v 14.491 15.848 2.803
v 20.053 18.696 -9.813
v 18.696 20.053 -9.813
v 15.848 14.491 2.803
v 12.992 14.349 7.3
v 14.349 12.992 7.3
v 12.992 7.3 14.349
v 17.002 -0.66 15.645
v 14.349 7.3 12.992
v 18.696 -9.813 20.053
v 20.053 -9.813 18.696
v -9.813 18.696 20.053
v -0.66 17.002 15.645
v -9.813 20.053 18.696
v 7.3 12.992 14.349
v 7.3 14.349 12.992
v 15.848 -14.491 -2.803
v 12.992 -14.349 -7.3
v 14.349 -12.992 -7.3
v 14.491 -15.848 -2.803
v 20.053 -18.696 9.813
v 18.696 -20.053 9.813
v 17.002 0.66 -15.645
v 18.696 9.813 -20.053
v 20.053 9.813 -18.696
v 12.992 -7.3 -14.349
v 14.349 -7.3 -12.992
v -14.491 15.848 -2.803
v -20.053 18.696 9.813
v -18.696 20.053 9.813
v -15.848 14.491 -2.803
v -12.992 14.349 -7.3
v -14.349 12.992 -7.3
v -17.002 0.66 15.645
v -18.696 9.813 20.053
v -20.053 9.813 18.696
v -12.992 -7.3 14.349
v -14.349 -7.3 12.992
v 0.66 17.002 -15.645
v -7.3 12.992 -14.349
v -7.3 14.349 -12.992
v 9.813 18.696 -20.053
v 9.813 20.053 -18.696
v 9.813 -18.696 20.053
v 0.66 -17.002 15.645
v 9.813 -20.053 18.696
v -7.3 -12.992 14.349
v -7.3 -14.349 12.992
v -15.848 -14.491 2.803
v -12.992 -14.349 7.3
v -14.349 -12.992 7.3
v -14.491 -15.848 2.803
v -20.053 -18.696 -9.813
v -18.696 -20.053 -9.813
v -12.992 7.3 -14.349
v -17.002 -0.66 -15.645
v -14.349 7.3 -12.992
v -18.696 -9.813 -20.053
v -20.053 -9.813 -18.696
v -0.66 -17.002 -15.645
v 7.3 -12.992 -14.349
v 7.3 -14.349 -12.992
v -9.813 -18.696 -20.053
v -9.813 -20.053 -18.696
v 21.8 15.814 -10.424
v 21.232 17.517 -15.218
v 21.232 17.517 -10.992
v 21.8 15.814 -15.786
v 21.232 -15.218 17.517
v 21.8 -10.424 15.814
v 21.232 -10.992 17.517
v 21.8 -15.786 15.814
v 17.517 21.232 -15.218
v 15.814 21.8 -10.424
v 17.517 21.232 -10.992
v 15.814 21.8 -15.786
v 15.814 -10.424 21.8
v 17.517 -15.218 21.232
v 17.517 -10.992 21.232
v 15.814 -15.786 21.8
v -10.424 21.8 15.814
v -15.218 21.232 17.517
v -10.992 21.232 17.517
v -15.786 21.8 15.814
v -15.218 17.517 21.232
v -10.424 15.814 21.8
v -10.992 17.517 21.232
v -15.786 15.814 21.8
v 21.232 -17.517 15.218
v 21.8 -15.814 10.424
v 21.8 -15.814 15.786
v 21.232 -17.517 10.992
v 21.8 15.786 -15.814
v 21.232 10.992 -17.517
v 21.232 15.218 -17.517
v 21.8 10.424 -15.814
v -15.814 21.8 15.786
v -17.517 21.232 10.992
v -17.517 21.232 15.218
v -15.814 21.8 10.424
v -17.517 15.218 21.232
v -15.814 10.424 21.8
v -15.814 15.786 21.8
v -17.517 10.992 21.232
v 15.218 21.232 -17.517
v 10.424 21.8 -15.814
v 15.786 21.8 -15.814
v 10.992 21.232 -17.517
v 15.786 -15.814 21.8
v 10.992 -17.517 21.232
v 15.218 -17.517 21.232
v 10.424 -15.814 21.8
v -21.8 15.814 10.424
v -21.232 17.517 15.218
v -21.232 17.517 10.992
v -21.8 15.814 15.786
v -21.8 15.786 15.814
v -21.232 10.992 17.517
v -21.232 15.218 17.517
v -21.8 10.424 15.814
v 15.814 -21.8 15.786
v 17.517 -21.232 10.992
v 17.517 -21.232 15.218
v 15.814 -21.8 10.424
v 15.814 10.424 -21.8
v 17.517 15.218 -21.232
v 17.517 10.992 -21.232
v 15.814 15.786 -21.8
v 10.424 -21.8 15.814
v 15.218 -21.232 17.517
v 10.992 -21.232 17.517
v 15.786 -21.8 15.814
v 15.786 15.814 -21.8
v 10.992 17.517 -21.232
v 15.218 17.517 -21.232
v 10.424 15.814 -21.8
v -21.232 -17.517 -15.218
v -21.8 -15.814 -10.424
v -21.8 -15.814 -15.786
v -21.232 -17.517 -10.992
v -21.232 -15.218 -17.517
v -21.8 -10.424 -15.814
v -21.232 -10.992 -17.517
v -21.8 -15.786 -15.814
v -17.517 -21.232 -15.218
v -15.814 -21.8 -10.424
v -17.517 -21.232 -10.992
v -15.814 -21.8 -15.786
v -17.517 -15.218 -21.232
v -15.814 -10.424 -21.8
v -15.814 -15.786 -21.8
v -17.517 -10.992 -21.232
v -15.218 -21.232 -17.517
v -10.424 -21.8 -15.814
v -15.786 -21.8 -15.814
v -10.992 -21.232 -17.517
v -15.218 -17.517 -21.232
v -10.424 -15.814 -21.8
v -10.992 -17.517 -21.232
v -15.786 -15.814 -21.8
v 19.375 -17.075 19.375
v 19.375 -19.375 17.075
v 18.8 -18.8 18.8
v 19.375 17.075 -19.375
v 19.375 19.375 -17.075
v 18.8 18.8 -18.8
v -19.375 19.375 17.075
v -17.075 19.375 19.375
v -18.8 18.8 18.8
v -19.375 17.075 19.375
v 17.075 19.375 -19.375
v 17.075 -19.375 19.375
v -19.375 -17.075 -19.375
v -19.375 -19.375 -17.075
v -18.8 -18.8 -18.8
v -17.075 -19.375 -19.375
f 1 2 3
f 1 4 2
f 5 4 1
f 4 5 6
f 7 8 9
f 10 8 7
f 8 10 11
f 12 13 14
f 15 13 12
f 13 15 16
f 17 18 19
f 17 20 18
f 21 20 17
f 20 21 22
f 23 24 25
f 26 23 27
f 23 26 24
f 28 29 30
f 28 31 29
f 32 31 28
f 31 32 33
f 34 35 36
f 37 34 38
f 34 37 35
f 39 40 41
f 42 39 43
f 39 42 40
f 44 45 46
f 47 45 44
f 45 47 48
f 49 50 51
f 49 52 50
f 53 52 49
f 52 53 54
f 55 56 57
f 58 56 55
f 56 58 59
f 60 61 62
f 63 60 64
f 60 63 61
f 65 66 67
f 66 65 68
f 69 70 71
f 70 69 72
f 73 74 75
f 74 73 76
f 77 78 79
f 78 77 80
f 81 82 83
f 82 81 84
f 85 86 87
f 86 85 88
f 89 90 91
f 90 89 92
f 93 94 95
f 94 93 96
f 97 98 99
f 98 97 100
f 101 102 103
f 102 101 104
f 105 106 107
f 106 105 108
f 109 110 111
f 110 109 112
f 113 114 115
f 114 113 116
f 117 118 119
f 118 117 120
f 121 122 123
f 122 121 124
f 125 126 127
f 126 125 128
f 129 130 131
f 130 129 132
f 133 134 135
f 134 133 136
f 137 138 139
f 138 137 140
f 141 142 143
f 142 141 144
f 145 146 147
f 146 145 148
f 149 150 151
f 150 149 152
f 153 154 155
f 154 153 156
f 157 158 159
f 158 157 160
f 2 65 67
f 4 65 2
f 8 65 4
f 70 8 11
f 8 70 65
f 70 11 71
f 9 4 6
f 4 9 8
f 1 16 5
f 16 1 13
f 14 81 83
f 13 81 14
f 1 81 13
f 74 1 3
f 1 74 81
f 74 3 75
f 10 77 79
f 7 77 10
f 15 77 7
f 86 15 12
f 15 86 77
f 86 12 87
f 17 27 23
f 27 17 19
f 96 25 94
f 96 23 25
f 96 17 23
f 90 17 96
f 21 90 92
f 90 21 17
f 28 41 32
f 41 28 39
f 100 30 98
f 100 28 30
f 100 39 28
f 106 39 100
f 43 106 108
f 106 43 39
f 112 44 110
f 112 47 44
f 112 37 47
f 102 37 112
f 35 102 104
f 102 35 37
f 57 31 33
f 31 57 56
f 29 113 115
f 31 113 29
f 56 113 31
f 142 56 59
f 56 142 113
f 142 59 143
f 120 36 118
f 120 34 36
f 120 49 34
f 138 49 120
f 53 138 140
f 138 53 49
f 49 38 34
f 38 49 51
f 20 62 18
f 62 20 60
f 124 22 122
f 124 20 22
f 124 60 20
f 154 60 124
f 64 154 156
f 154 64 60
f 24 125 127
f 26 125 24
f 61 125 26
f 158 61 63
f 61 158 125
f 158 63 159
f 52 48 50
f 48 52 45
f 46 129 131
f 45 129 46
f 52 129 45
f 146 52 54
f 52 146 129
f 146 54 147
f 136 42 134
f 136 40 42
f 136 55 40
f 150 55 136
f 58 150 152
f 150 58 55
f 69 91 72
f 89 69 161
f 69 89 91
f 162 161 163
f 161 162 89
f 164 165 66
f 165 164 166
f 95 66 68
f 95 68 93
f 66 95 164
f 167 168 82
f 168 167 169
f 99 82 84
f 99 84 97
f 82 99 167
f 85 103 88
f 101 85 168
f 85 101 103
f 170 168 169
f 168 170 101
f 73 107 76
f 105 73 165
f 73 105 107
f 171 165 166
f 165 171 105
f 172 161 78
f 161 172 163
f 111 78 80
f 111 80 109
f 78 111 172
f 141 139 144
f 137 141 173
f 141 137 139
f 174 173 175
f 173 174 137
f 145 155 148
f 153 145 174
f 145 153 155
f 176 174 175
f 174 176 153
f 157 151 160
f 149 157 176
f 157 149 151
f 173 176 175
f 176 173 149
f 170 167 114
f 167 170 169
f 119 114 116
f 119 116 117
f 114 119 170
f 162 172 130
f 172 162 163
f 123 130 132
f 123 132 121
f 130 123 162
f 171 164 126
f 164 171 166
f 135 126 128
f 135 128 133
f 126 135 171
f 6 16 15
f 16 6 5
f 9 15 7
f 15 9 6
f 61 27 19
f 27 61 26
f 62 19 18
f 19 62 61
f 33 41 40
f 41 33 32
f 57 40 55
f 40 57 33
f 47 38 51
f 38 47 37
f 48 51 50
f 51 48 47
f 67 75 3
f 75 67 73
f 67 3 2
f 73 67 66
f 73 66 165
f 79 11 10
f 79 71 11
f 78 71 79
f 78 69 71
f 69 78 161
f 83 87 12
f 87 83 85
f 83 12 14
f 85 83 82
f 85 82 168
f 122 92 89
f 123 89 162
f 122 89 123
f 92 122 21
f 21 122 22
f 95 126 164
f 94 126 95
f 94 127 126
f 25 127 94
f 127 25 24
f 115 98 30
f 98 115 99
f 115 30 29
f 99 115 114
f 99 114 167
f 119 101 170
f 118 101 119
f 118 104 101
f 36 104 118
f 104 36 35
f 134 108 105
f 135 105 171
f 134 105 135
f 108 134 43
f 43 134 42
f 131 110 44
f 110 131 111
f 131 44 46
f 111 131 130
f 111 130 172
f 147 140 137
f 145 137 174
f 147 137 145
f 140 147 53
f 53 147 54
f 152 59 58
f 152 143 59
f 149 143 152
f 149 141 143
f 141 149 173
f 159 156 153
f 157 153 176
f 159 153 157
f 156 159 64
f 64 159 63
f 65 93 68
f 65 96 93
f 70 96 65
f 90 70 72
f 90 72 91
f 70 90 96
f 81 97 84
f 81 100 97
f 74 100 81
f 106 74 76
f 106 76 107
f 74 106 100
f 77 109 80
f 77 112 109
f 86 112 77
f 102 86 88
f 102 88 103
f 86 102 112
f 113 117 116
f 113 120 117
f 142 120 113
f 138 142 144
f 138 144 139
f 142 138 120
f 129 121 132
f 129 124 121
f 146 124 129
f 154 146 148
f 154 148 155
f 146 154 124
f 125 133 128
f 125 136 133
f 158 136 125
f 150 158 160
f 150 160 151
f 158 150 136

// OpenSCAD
/*
  crystal solids via Miller indices 
  
   see http://kitwallace.tumblr.com/tagged/crystal 
   
   Kit Wallace October 2015
   
   systems
       cubic - complete 
       tetra  - only one class
   
   todo
      remaining classes
      deduce modifiers from crystal class   
      twinning
      get right/left or positive/negative terminology right 
*/


// some constants
PHI = (1 + sqrt(5))/2;

K=tan(60);

COLORS=["lightpink","lime","aquamarine","khaki","silver","lightsalmon","lightgreen","orange","cadetblue","tan","chartreuse","violet"];


// basic functions

function flatten(l) = [ for (a = l) for (b = a) b ] ;

function vcontains(val,list) =
     search([val],list)[0] != [];
       
function distinct(list,dlist=[],i=0) =  // return only distinct items of list
      i==len(list)
         ? dlist
         : vcontains(list[i],dlist)
             ? distinct(list,dlist,i+1)
             : distinct(list,concat(dlist,[list[i]]),i+1)
      ;

function sum(list,i=0) =  
      i < len(list)
        ?  list[i] + sum(list,i+1)
        :  0;

// solid construction
  
module orient_to(centre, normal) {   
      translate(centre)
      rotate([0, 0, atan2(normal.y, normal.x)]) //rotation
      rotate([0, atan2(sqrt(pow(normal.x, 2)+pow(normal.y, 2)),normal.z), 0])
      children();
}

module face(normal, d=1, size=20) {
   orient_to([0,0,0],normal)
       translate([0,0, d + size/2])
            cube([10*size,10*size,size],center=true);
} 

module solid(faces,d=1,color="lightblue",size=40) {
 /* faces is a list of normals (Miller indices)
    d is either a scaler, the distance of each face from the origin or a list of distances, one for each face
 */  
 color(color)
    difference() {
     sphere(size);
     for(i = [0:len(faces)-1])  {
       face = faces[i];
       fd = d[i] == undef ? d : d[i];
       face(face,d=fd,size=size);
     }
 }
}

// functions to expand a form into faces using eg perms and combs

function perm3(l) =
// lazy until I code general perms with duplicates
 distinct(
   [[l[0],l[1],l[2]],
   [l[0],l[2],l[1]],
   [l[1],l[0],l[2]],
   [l[1],l[2],l[0]],
   [l[2],l[0],l[1]],
   [l[2],l[1],l[0]]
]);
        
function combs(list,n=0) =
   n < len(list)-1
   ? [for (j=list[n])
       for (sl= combs(list,n+1))
           concat(j,sl)
     ]
   : list[n] ;
 
       
function expand(list) =   
// needs a better name
  [for (x= list)
      x== 0 ? 0 : [x,-x]
  ];

// face generators
  
function shift(face,k=1) = [face[k%3],face[(k+1)%3],face[(k+2)%3]];
       
function cycle(face) =
    [face,shift(face,1),shift(face,2)];

function full_symmetry(form) =
   distinct(flatten([for (comb = combs(expand(form))) perm3(comb)]));
  
function tetra_symmetry(form) =
   distinct(flatten([for (face = [form,[form[1],form[0],form[2]]]) combs(expand(face))]));

function gyroid_symmetry(form,even=true) =
    concat(parity_filter(distinct(flatten([for (face = cycle(form)) combs(expand(face))])),even),
           parity_filter(distinct(flatten([for (face = cycle([form[0],form[2],-form[1]])) combs(expand(face))])), ! even)
    );

function opposite(face) =
   [for (a=face) 
       a==0 ? 0 : - a];

function mirror(face) =  [ face,opposite(face)];   

function switch(face) = [face[1],face[0],face[2]];

function trapezohedral_symmetry(form) =
 concat(
    parity_filter(combs(expand(form)),form),
    parity_filter(combs(expand(switch(form))),mirror(form))
    );

// bit of a hack - sb a filter
function rotate_z(form) = [-form[1],form[0],form[2]]; 
   
function rotate_z4(form) = 
   let (mform=[form[0],form[1],-form[2]])
   [form,
    rotate_z(form),
    rotate_z(rotate_z(form)),
    rotate_z(rotate_z(rotate_z(form))),
    mform,
    rotate_z(mform),
    rotate_z(rotate_z(mform)),
    rotate_z(rotate_z(rotate_z(mform))) 
   ];
   
 // filters
           
function parity(face) =
    let(parity = sum( [for (i=face) i > 0 ? 1 : 0]))
    parity % 2 == 0 ;
 
function parity_filter(faces,form) =
    [for (face=faces) if (parity(face) == parity(form) ) face]; 

function unsigned(face) = [abs(face[0]),abs(face[1]),abs(face[2])];

function same_order(form,face) = 
    form == face || form==shift(face) || form==shift(shift(face));

function order_filter(faces,form) =
    [for (face=faces) 
        if (same_order(unsigned(form),unsigned(face))) face
    ];

function hemi_filter(faces,axis,form) =
     let(asign=sign(form[axis]))
     [for (face=faces) 
          if(sign(face[abs(axis)])==asign) face
     ];
          
// face construction      
function filter_faces(form,faces,modifiers,i=0) =
    i < len(modifiers)
       ? let(filter=modifiers[i])
         let(filtered_faces =
             filter=="order"
             ? order_filter(faces,form)
             : filter=="parity" 
             ? parity_filter(faces,form)
             : filter=="hemiz"
             ? hemi_filter(faces,2,form)
             : faces)
         filter_faces(form,filtered_faces,modifiers,i+1)
       : faces;
          
function form_faces(form,base,modifiers) =
    let(base_faces = 
         base=="full" 
       ? full_symmetry(form)
       : base=="tetra" 
       ? tetra_symmetry(form)
       : base=="gyroid"
       ? gyroid_symmetry(form)
       : base=="trapezoid" 
       ? trapezohedral_symmetry(form)
       : base=="mirror"
       ? mirror(form)
       : base=="pedion"
       ? [form]
       : base=="rotate_z4"
       ? rotate_z4(form)
       : [form])
     let(faces = filter_faces(form,base_faces,modifiers) )
     faces;

// crystal rendering

module c_render(crystal,pert=0) {
    forms=crystal[1];
    intersection_for (i=[0:len(forms)-1]) 
       c_render_part(crystal,i,pert);
}

module c_render_part(crystal,k,pert=0,label=false) {
    data=crystal[0];
    forms=crystal[1];
    scale(data[1])  
      {
         form_spec=forms[k];     
         form=form_spec[0];
         d=form_spec[1];
         base = form_spec[2] == "" || form_spec[2] == undef  ?  data[2] : form_spec[2];
         modifiers=form_spec[3] == undef ? [] : form_spec[3] ;  
         name = form_spec[4] == undef ? "" :   form_spec[4];     
         ci= k % len(COLORS);
         color = COLORS[ci]== undef ? "green" : COLORS[ci];
         faces=form_faces(form,base,modifiers);  
         echo(form_spec);
         if(label) color("black") {
             translate([0,0,-3.5]) rotate([45,0,25]) scale(0.05) text(name,halign="center",font="Georgia:style=Regular"   );
             translate([0,0,-4.5]) rotate([45,0,25]) scale(0.05) text(str(form),halign="center",font="Georgia:style=Regular"   );
         }
         echo(name,color,form,d+pert*rands(0,1,1)[0],base,modifiers, len(faces),faces);
         solid(faces,d,color);      
      }  
}

module c_animate(crystal,label=true) {
    n=len(crystal[1]);
    k=min(floor($t*n),n-1);
    c_render_part(crystal,k,label=label); 
}

// data
/*
   the data structure has the format:
       [header [form]*]
   header = [name,scale,default_base symmetry,class]
   form =[miller indices, d, base ("" = default_base), [modifiers], name]
   
*/
// Cubic system

cubic_system = [
    ["cubic system",[1,1,1], "full"],
    [
      [[1,0,0],1,"",[],"cube"],
      [[1,1,0],1,"",[],"rhombic dodecahedron"],
      [[1,2,0],1,"",[],"tetrahexahedron"],
      [[1,2,0],1,"",["order"],"pentagonal dodecahedron"],  
      [[1,1,1],1,"",[],"octahedron"],
      [[1,1,1],1,"",["parity"],"tetrahedron"],
      [[2,1,1],1,"",[],"icositetrahedron"],
      [[2,1,1],1,"",["parity"],"triakis tetrahedron"],
      [[2,2,1],1,"",[],"triakis octahedron"],
      [[2,2,1],1,"",["parity"],"deltoid dodecahedron"],
      [[3,2,1],1,"",[],"hexakis octahedron"],
      [[3,2,1],1,"",["order"],"diakisdodecahedron"],
      [[3,2,1],1,"",["parity"], "hexatetrahedron"],
      [[3,2,1],1,"gyroid",[], "pentagonal icositetrahedron"],
      [[3,2,1],1,"",["parity","order"],"tetrahedral pentagonal dodecaheron"]
    ]
];

class_m3m = [
// cubic holosymmetric, hexakis octheral. galena type
    ["class_m3m",[1,1,1],"full"],
    [
      [[1,0,0],1],  // cube
      [[1,1,0],1],  // rhombdodecahedron
      [[1,2,0],1],  // tetrahexahedron
      [[1,1,1],1],  // octahedron
      [[2,1,1],1],  // hll h > l icositetrahedron
      [[2,2,1],1],  // hhl h > l triakisoctahedron
      [[3,2,1],1]   // hexoctahedron
    ]
    ]; 
garnet = [
// http://www.smorf.nl/index.php?crystal=Garnet_84
  ["garnet",[1,1,1],"full","m3m"],
  [
    [[3,2,1],1.04],
    [[2,1,1],1],
    [[1,1,0],1.047]
  ]
];

fluorite_2 = [
// http://www.smorf.nl/index.php?crystal=Fluorite_066
   ["Fluorite",[1,1,1],"full","m3m"],
   [
    [[2,2,1],1],
    [[1,1,1],1],
    [[1,1,0],0.97]
   ] 
];

galena=
// http://www.smorf.nl/index.php?crystal=Galena_023 
   [
     ["Galena",[1,1,1],"full","m3m"],
     [
        [[2,2,1],1],
        [[1,0,0],1.02]
     ]
];


analcime_05 = [
   ["Analcime_05",[1,1,1],"full","m3m"],
   [
      [[3,2,2],0.99],
      [[2,1,1],1]
   ]   
];

class_m3 = [
// cubic diakisdodecahedral, pyrite type
    ["class_m3m",[1,1,1],"full"],
    [
      [[1,0,0],1],  // cube
      [[1,1,0],1],  // rhombdodecahedron
      [[1,2,0],1,"",["order"]],  // pentagonal dodecahedron
      [[2,1,0],1,"",["order"]],  // pentagonal dodecahedron
      [[1,1,1],1],  // octahedron
      [[2,1,1],1],  // hll h > l icositetrahedron
      [[2,2,1],1],  // hhl h > l triakisoctahedron
      [[3,2,1],1,"",["order"]],   // diakisdodecahedron
      [[3,1,2],1,"",["order"]]   // diakisdodecahedron
   ]
 ]; 

pyrite_008= [
   ["Pyrite_008",[1,1,1],"full","m3"],
   [
      [[2,1,0],1,"",["order"]],
      [[1,1,1],0.76]
   ]  
];

class_43m = [
// cubic hexakishedral
// tetrahedrite type

    ["class_-43m",[1,1,1],"full"],
    [
      [[1,0,0],1],  // cube
      [[1,1,0],1],  // rhombdodecahedron
      [[2,1,0],1],  // tetrahexahedron
      [[1,1,1],1,"",["parity"]],  // tetrahedron
      [[1,-1,1],1,"",["parity"]],  // tetrahedron
      [[2,1,1],1,"",["parity"]],  // tristetrahedron
      [[2,-1,1],1,"",["parity"]],  // tristetrahedron
      [[2,2,1],1,"",["parity"]],  // deltoid dodecahedron
      [[2,-2,1],1,"",["parity"]],  // deltoid dodecahedron
      [[1,2,3],1,"",["parity"]],  // hexatetrahedron
      [[1,-2,3],1,"",["parity"]]    // hexatetrahedron
   ]
 ];
 
 sphalerite= [
// http://www.smorf.nl/index.php?crystal=Sphalerite_MA1
   ["sphalerite",[1,1,1],"full","-43m"],
   [
      [[1,1,1],1,"",["parity"]],
      [[1,-1,1],0.5,"",["parity"]]
   ]
];

boracite = [
// http://www.smorf.nl/index.php?crystal=Boracite_02
    ["boracite", [1,1,1],"full","-43m"],
    [ [[1,0,0],1],
      [[0,1,1],1.2],
      [[1,1,1],1.3,"",["parity"]]
    ]
];

tetrahedrite= [
//  http://www.smorf.nl/index.php?crystal=Tetrahedrite_034
  ["Tetrahedrite",[1,1,1],"full","-43m"],
  [
    [[3,3,2],1.03,"",["parity"]],
    [[3,1,0],1.2841],
    [[2,1,1],1,"",["parity"]],      // positive tetrakis tetrahedron
    [[2,-1,1],1.535,"",["parity"]], // negative tetrakis tetrahedron
    [[1,1,1],1,"",["parity"]] ,     // positive tetrahedron
    [[1,1,0],1.37],
    [[1,0,0],1.09]
  ]
];

class_432 = [
// pentagonal icositetrahedral
    ["class_432",[1,1,1],"full","432"],
    [
      [[1,0,0],1],  //cube
      [[1,1,0],1],  // rhombdodecahedron
      [[1,2,0],1],  //tetrahexahedron
      [[1,1,1],1],  // octahedron
      [[2,1,1],1],  // hll h > l icositetrahedron
      [[2,2,1],1],  // hhl h > l triakisoctahedron
      [[1,1,2],1],  // triakisoctahedron
      [[1,2,3],1,"gyroid"],   // pentagonal icositetrahedron - actually 4 enantiomorphs
   ]
    ];    

cuprite= [
// http://www.smorf.nl/?crystal=Cuprite_D1
    ["Cuprite",[1,1,1],"full", "432"],
    [ [[1,0,0],1],
      [[1,1,1],1.15],
      [[9,8,6],1.2,"gyroid"]
    ]
 ];
 
class_23 = [
// tetrahedral pentagonal dodecahedral
    ["class_23",[1,1,1],"full","23"],
    [
      [[1,0,0],1],  //cube
      [[1,1,0],1],  // rhombdodecahedron
      [[1,2,0],1,"",["order"]],  // pentagonal dodecahedron
      [[3,1,0],1,"",["order"]],  // pentagonal dodecahedron
      [[1,1,1],1,"",["parity"]],  // tetrahedron
      [[1,-1,1],1,"",["parity"]],  // tetrahedron
      [[2,2,1],1,"",["parity"]],  // deltoid dodecahedron
      [[2,-2,1],1,"",["parity"]],  // deltoid dodecahedron
      [[3,2,1],1,"",["parity","order"]],   // tetrahedral pentagonal dodecaheron
      [[2,-3,1],1,"",["parity","order"]],   // tetrahedral pentagonal dodecaheron
   ]
    ]; 

// Tetrahedral system
// class 4/mmm Tetragonal holosymmetric, ditetragonal bipyramidal, zircon type
// after Bishop p104 ff
class_4mmm= [
     ["Class 4mmm",[1,1,1.2],"tetra","4/mmm"],
     [
       [[1,0,0],1],  //tetragonal prism - first order
       [[1,1,0],1],  //tetragonal prism - second order
       [[0,0,1],1,"mirror"],  //pinacoid 
       [[5,1,0],1],  // Ditetragonal prism {hk0]
       [[2,0,1],1],  //tetragonal bipyramid first order
       [[3,3,1],1],  //tetragonal bipyramid second order
       [[1,2,3],1]  // ditetragonal bipyramid
    ]
];

zircon = [
// http://webmineral.com/data/Zircon.shtml
// http://www.thingiverse.com/thing:833494
// estimated distances
     ["zircon",[1,1,1],"tetra","4mmm"],
     [
       [[1,1,0],0.8],
       [[1,1,1],1.3],
       [[3,3,1],1]
      ]
];

    
anatase_36 = [
    ["Anatase_036",[1,1,2.514],"tetra","4mmm"],
    [[[1,0,1],1],
    [[1,0,7],0.3],
    [[1,1,14],0.27],
    [[0,1,14],0.265],
    [[1,1,2],0.97],
    [[[0,0,1]],0.25,"mirror"]
]];

anatase_003=[
   ["anatase_003",[1,1,2.514],"tetra","4mmm"],
   [
        [[1,0,1],1] 
    ]
];

anatase_033=[
   ["anatase_033",[1,1,2.514],"tetra","4mmm"],
   [
       [[1,0,1],1],
       [[1,1,2],1.1],
       [[1,0,3],0.95],
       [[0,0,1],0.855]
   ]  
];

anatase_036 = [
   ["anatase_036",[1,1,2.514],"tetra","4mmm"],
   [
      [[1,0,1],1.25],
      [[1,0,2],0.92],
      [[1,0,3],0.8],
      [[0,0,1],0.6]
   ]
];

anatase_053=[["anatase_53",[1,1,2.514],"tetra","4mmm"],
    [
     [[1,0,1],1],
     [[1,0,7],0.3],
     [[1,1,14],0.27],
     [[0,1,14],0.265],
     [[1,1,2],0.97],
     [[0,0,1],0.25]
    ]   
];

anatase_063 = [
    ["anatase_63",[1,1,2.514],"tetra","4mmm"],
    [
      [[1,0,0],1.27],
      [[1,0,1],0.92],
      [[1,1,2],0.97],
      [[3,0,7],0.62],
      [[3,3,2],1.47]
    ]
];
Cassiterite_D1 =[
["Cassiterite_D1",[1,1,0.673],"tetra","4mmm"],
[ 
  [[1,1,1],1],
  [[1,0,1],1]
]  
];

Calomel_D4=  [
 ["Calomel_D4", [4.45,4.45,10.89],"tetra","4mmm"],
 [
  [[1,1,0],0.8],
  [[1,0,0],1.05],
  [[2,0,1],1.05],
  [[1,0,1],1],
  [[1,0,3],0.85]
  ]   
 ];


class_422 = [
// tetragonal holoaxial, tetragonal trapezohedral
    ["class_422",[1,1,1.2],"tetra","422"],
    [
      [[1,0,0],1],  //tetragonal prism - first order
      [[1,1,0],1],   //tetragonal prism - second order
      [[0,0,1],1,"mirror"],  //pinacoid 
      [[2,1,0],1], // Ditetragonal prism {hk0]
      [[2,0,1],1],  // tetragonal bipyramid first order
      [[3,3,1],1],  // tetragonal bipyramid second order
      [[1,2,3],1,"trapezoid"]   // tetragonal trapesohedron
    ]
    ];

class_42m = [
// tetragonal holoaxial, tetragonal trapezohedral
    ["class_-42m",[1,1,1.2],"tetra","-42m"],
    [
      [[1,0,0],1],  //tetragonal prism - first order
      [[1,1,0],1],   //tetragonal prism - second order
      [[0,0,1],1,"mirror"],  //pinacoid 
      [[2,1,0],1], // Ditetragonal prism {hk0]
      [[2,0,1],1],  // tetragonal bipyramid first order
      [[2,2,1],1,"",["parity"]],  // tetragonal sphenoid
      [[3,2,1],1,"",["parity"]]   // tetragonal scalenohedron, ditetragonal bisphenoid
    ]
    ];
chalcopyrite = [ 
// http://www.smorf.nl/?crystal=Chalcopyrite_019
   ["Chalcopyrite", [1,1,1.966],"tetra","42m"],
   [
       [[1,1,2],1,"",["parity"]],
       [[1,1,-2],0.6,"",["parity"]]
   ]
   ];

chalcopyrite_037 = [ 
// http://www.smorf.nl/?crystal=Chalcopyrite_019
   ["Chalcopyrite", [1,1,1.966],"tetra","42m"],
   [  [[0,0,1],1],
       [[0,1,-1],1.49],
       [[ 0,1,1],1.5],
       [[1,1,-2],0.91,"",["parity"]],
       [[1,1,2],1.12,"",["parity"]]
   ]
   ];
   
class_4mm = [
// ditetragonal pyramidal
    ["class_-4m",[1,1,0.5],"tetra","4m"],
    [
      [[1,0,0],1],  //tetragonal prism - first order
      [[1,1,0],1],   //tetragonal prism - second order
      [[0,0,1],1,"pedion"],  // pedion
      [[0,0,-1],1,"pedion"],  //pedion
      [[2,1,0],1], // Ditetragonal prism {hk0]
      [[2,0,1],1,"",["hemiz"]],   // tetragonal pyramid
      [[2,0,-1],1,"",["hemiz"]],  // tetragonal pyramid
      [[2,2,1],1,"",["hemiz"]],   // tetragonal pyramid
      [[2,2,-1],1,"",["hemiz"]],  // tetragonal pyramid
      [[3,2,1],1,"",["hemiz"]],   // tetragonal scalenohedron, ditetragonal bisphenoid
      [[3,2,-1],1,"",["hemiz"]]   // tetragonal scalenohedron, ditetragonal 
    ]
    ];

diabolite =[
// Bishop fig 76 p 117
    ["diabolite",[1,1,1],"tetra","4mm"],
    [
      [[1,0,0],1],
      [[1,1,1],1,"",["hemiz"]],
      [[1,1,2],1,"",["hemiz"]],  
      [[1,1,2],1,"",["hemiz"]], 
      [[1,0,1],1,"",["hemiz"]], 
      [[2,0,1],1,"",["hemiz"]], 
      [[1,0,-1],1,"",["hemiz"]], 
      [[2,0,-1],1,"",["hemiz"]], 
      [[0,0,1],1,"pedion"],
      [[0,0,-1],1,"pedion"]
    ]
    ];
    
class_4m = [
// ditetragonal pyramidal
    ["class_4/m",[1,1,1],"tetra","4/m"],
    [
      [[1,0,0],1],  //tetragonal prism
      [[1,1,0],1],   //tetragonal prism 
      [[2,1,0],1,"rotate_z4"],   //tetragonal prism 
      [[0,0,1],1,"mirror"],  // pedion
      [[2,0,1],1],  // tetragonal bipyramid 
      [[3,3,1],1,"rotate_z4"],  // tetragonal bipyramid 
      [[1,2,3],1,"rotate_z4"]   // tetragonal bipyramid
    ]
    ];

scheelite = [
// Bishop fig 78 p118 moded
// http://www.smorf.nl/index.php?crystal=Scheelite_07
    ["class_4/m",[1,1,1.3],"tetra","4/m"],
    [
      [[1,0,1],0.9],   //tetragonal prism 
      [[1,1,1],1.1,"rotate_z4"],   // tetragonal bipyramid
      [[1,2,1],1.11,"rotate_z4"],   // tetragonal bipyramid
      [[1,3,1],1.1,"rotate_z4"],   // tetragonal bipyramid
      ]
    ];

scapolite = [
// http://www.smorf.nl/index.php?crystal=Scapolite_32
    ["class_4/m",[1,1,0.63],"tetra","4/m"],
    [
      [[1,0,0],1.01],   //tetragonal prism
      [[1,0,1],2.01],   //tetragonal prism 
      [[1,1,0],0.95],   //tetragonal prism 
      [[2,-1,1],1.6,"rotate_z4"],   // tetragonal bipyramid
      [[2,1,1],1.44,"rotate_z4"],   // tetragonal bipyramid
      [[3,0,1],1.41,"rotate_z4"],   // tetragonal bipyramid
      [[3,1,0],1.03,"rotate_z4"]   // tetragonal bipyramid
    ]
    ];

class_4bar = [
// ditetragonal pyramidal
    ["class_-4",[1,1,0.5],"tetra","4/m"],
    [
      [[1,0,0],1],  //tetragonal prism
      [[1,1,0],1],   //tetragonal prism 
      [[2,1,0],1,"rotate_z4"],   //tetragonal prism 
      [[0,0,1],1,"mirror"],  // pedion
      [[2,0,1],1,"rotate_z4",["parity"]],  // tetragonal sphenoid
      [[3,3,1],1,"",["parity"]],  // tetragonal bipyramid 
      [[1,2,3],1,"rotate_z4",["parity"]]   // tetragonal bipyramid
    ]
    ]; 

scale(20)  c_render(tetrahedrite);
// scale(20) c_animate(class_4bar);
// scale(20) c_render_part(cubic_system,4);
// scale(20)  c_animate(cubic_system);
